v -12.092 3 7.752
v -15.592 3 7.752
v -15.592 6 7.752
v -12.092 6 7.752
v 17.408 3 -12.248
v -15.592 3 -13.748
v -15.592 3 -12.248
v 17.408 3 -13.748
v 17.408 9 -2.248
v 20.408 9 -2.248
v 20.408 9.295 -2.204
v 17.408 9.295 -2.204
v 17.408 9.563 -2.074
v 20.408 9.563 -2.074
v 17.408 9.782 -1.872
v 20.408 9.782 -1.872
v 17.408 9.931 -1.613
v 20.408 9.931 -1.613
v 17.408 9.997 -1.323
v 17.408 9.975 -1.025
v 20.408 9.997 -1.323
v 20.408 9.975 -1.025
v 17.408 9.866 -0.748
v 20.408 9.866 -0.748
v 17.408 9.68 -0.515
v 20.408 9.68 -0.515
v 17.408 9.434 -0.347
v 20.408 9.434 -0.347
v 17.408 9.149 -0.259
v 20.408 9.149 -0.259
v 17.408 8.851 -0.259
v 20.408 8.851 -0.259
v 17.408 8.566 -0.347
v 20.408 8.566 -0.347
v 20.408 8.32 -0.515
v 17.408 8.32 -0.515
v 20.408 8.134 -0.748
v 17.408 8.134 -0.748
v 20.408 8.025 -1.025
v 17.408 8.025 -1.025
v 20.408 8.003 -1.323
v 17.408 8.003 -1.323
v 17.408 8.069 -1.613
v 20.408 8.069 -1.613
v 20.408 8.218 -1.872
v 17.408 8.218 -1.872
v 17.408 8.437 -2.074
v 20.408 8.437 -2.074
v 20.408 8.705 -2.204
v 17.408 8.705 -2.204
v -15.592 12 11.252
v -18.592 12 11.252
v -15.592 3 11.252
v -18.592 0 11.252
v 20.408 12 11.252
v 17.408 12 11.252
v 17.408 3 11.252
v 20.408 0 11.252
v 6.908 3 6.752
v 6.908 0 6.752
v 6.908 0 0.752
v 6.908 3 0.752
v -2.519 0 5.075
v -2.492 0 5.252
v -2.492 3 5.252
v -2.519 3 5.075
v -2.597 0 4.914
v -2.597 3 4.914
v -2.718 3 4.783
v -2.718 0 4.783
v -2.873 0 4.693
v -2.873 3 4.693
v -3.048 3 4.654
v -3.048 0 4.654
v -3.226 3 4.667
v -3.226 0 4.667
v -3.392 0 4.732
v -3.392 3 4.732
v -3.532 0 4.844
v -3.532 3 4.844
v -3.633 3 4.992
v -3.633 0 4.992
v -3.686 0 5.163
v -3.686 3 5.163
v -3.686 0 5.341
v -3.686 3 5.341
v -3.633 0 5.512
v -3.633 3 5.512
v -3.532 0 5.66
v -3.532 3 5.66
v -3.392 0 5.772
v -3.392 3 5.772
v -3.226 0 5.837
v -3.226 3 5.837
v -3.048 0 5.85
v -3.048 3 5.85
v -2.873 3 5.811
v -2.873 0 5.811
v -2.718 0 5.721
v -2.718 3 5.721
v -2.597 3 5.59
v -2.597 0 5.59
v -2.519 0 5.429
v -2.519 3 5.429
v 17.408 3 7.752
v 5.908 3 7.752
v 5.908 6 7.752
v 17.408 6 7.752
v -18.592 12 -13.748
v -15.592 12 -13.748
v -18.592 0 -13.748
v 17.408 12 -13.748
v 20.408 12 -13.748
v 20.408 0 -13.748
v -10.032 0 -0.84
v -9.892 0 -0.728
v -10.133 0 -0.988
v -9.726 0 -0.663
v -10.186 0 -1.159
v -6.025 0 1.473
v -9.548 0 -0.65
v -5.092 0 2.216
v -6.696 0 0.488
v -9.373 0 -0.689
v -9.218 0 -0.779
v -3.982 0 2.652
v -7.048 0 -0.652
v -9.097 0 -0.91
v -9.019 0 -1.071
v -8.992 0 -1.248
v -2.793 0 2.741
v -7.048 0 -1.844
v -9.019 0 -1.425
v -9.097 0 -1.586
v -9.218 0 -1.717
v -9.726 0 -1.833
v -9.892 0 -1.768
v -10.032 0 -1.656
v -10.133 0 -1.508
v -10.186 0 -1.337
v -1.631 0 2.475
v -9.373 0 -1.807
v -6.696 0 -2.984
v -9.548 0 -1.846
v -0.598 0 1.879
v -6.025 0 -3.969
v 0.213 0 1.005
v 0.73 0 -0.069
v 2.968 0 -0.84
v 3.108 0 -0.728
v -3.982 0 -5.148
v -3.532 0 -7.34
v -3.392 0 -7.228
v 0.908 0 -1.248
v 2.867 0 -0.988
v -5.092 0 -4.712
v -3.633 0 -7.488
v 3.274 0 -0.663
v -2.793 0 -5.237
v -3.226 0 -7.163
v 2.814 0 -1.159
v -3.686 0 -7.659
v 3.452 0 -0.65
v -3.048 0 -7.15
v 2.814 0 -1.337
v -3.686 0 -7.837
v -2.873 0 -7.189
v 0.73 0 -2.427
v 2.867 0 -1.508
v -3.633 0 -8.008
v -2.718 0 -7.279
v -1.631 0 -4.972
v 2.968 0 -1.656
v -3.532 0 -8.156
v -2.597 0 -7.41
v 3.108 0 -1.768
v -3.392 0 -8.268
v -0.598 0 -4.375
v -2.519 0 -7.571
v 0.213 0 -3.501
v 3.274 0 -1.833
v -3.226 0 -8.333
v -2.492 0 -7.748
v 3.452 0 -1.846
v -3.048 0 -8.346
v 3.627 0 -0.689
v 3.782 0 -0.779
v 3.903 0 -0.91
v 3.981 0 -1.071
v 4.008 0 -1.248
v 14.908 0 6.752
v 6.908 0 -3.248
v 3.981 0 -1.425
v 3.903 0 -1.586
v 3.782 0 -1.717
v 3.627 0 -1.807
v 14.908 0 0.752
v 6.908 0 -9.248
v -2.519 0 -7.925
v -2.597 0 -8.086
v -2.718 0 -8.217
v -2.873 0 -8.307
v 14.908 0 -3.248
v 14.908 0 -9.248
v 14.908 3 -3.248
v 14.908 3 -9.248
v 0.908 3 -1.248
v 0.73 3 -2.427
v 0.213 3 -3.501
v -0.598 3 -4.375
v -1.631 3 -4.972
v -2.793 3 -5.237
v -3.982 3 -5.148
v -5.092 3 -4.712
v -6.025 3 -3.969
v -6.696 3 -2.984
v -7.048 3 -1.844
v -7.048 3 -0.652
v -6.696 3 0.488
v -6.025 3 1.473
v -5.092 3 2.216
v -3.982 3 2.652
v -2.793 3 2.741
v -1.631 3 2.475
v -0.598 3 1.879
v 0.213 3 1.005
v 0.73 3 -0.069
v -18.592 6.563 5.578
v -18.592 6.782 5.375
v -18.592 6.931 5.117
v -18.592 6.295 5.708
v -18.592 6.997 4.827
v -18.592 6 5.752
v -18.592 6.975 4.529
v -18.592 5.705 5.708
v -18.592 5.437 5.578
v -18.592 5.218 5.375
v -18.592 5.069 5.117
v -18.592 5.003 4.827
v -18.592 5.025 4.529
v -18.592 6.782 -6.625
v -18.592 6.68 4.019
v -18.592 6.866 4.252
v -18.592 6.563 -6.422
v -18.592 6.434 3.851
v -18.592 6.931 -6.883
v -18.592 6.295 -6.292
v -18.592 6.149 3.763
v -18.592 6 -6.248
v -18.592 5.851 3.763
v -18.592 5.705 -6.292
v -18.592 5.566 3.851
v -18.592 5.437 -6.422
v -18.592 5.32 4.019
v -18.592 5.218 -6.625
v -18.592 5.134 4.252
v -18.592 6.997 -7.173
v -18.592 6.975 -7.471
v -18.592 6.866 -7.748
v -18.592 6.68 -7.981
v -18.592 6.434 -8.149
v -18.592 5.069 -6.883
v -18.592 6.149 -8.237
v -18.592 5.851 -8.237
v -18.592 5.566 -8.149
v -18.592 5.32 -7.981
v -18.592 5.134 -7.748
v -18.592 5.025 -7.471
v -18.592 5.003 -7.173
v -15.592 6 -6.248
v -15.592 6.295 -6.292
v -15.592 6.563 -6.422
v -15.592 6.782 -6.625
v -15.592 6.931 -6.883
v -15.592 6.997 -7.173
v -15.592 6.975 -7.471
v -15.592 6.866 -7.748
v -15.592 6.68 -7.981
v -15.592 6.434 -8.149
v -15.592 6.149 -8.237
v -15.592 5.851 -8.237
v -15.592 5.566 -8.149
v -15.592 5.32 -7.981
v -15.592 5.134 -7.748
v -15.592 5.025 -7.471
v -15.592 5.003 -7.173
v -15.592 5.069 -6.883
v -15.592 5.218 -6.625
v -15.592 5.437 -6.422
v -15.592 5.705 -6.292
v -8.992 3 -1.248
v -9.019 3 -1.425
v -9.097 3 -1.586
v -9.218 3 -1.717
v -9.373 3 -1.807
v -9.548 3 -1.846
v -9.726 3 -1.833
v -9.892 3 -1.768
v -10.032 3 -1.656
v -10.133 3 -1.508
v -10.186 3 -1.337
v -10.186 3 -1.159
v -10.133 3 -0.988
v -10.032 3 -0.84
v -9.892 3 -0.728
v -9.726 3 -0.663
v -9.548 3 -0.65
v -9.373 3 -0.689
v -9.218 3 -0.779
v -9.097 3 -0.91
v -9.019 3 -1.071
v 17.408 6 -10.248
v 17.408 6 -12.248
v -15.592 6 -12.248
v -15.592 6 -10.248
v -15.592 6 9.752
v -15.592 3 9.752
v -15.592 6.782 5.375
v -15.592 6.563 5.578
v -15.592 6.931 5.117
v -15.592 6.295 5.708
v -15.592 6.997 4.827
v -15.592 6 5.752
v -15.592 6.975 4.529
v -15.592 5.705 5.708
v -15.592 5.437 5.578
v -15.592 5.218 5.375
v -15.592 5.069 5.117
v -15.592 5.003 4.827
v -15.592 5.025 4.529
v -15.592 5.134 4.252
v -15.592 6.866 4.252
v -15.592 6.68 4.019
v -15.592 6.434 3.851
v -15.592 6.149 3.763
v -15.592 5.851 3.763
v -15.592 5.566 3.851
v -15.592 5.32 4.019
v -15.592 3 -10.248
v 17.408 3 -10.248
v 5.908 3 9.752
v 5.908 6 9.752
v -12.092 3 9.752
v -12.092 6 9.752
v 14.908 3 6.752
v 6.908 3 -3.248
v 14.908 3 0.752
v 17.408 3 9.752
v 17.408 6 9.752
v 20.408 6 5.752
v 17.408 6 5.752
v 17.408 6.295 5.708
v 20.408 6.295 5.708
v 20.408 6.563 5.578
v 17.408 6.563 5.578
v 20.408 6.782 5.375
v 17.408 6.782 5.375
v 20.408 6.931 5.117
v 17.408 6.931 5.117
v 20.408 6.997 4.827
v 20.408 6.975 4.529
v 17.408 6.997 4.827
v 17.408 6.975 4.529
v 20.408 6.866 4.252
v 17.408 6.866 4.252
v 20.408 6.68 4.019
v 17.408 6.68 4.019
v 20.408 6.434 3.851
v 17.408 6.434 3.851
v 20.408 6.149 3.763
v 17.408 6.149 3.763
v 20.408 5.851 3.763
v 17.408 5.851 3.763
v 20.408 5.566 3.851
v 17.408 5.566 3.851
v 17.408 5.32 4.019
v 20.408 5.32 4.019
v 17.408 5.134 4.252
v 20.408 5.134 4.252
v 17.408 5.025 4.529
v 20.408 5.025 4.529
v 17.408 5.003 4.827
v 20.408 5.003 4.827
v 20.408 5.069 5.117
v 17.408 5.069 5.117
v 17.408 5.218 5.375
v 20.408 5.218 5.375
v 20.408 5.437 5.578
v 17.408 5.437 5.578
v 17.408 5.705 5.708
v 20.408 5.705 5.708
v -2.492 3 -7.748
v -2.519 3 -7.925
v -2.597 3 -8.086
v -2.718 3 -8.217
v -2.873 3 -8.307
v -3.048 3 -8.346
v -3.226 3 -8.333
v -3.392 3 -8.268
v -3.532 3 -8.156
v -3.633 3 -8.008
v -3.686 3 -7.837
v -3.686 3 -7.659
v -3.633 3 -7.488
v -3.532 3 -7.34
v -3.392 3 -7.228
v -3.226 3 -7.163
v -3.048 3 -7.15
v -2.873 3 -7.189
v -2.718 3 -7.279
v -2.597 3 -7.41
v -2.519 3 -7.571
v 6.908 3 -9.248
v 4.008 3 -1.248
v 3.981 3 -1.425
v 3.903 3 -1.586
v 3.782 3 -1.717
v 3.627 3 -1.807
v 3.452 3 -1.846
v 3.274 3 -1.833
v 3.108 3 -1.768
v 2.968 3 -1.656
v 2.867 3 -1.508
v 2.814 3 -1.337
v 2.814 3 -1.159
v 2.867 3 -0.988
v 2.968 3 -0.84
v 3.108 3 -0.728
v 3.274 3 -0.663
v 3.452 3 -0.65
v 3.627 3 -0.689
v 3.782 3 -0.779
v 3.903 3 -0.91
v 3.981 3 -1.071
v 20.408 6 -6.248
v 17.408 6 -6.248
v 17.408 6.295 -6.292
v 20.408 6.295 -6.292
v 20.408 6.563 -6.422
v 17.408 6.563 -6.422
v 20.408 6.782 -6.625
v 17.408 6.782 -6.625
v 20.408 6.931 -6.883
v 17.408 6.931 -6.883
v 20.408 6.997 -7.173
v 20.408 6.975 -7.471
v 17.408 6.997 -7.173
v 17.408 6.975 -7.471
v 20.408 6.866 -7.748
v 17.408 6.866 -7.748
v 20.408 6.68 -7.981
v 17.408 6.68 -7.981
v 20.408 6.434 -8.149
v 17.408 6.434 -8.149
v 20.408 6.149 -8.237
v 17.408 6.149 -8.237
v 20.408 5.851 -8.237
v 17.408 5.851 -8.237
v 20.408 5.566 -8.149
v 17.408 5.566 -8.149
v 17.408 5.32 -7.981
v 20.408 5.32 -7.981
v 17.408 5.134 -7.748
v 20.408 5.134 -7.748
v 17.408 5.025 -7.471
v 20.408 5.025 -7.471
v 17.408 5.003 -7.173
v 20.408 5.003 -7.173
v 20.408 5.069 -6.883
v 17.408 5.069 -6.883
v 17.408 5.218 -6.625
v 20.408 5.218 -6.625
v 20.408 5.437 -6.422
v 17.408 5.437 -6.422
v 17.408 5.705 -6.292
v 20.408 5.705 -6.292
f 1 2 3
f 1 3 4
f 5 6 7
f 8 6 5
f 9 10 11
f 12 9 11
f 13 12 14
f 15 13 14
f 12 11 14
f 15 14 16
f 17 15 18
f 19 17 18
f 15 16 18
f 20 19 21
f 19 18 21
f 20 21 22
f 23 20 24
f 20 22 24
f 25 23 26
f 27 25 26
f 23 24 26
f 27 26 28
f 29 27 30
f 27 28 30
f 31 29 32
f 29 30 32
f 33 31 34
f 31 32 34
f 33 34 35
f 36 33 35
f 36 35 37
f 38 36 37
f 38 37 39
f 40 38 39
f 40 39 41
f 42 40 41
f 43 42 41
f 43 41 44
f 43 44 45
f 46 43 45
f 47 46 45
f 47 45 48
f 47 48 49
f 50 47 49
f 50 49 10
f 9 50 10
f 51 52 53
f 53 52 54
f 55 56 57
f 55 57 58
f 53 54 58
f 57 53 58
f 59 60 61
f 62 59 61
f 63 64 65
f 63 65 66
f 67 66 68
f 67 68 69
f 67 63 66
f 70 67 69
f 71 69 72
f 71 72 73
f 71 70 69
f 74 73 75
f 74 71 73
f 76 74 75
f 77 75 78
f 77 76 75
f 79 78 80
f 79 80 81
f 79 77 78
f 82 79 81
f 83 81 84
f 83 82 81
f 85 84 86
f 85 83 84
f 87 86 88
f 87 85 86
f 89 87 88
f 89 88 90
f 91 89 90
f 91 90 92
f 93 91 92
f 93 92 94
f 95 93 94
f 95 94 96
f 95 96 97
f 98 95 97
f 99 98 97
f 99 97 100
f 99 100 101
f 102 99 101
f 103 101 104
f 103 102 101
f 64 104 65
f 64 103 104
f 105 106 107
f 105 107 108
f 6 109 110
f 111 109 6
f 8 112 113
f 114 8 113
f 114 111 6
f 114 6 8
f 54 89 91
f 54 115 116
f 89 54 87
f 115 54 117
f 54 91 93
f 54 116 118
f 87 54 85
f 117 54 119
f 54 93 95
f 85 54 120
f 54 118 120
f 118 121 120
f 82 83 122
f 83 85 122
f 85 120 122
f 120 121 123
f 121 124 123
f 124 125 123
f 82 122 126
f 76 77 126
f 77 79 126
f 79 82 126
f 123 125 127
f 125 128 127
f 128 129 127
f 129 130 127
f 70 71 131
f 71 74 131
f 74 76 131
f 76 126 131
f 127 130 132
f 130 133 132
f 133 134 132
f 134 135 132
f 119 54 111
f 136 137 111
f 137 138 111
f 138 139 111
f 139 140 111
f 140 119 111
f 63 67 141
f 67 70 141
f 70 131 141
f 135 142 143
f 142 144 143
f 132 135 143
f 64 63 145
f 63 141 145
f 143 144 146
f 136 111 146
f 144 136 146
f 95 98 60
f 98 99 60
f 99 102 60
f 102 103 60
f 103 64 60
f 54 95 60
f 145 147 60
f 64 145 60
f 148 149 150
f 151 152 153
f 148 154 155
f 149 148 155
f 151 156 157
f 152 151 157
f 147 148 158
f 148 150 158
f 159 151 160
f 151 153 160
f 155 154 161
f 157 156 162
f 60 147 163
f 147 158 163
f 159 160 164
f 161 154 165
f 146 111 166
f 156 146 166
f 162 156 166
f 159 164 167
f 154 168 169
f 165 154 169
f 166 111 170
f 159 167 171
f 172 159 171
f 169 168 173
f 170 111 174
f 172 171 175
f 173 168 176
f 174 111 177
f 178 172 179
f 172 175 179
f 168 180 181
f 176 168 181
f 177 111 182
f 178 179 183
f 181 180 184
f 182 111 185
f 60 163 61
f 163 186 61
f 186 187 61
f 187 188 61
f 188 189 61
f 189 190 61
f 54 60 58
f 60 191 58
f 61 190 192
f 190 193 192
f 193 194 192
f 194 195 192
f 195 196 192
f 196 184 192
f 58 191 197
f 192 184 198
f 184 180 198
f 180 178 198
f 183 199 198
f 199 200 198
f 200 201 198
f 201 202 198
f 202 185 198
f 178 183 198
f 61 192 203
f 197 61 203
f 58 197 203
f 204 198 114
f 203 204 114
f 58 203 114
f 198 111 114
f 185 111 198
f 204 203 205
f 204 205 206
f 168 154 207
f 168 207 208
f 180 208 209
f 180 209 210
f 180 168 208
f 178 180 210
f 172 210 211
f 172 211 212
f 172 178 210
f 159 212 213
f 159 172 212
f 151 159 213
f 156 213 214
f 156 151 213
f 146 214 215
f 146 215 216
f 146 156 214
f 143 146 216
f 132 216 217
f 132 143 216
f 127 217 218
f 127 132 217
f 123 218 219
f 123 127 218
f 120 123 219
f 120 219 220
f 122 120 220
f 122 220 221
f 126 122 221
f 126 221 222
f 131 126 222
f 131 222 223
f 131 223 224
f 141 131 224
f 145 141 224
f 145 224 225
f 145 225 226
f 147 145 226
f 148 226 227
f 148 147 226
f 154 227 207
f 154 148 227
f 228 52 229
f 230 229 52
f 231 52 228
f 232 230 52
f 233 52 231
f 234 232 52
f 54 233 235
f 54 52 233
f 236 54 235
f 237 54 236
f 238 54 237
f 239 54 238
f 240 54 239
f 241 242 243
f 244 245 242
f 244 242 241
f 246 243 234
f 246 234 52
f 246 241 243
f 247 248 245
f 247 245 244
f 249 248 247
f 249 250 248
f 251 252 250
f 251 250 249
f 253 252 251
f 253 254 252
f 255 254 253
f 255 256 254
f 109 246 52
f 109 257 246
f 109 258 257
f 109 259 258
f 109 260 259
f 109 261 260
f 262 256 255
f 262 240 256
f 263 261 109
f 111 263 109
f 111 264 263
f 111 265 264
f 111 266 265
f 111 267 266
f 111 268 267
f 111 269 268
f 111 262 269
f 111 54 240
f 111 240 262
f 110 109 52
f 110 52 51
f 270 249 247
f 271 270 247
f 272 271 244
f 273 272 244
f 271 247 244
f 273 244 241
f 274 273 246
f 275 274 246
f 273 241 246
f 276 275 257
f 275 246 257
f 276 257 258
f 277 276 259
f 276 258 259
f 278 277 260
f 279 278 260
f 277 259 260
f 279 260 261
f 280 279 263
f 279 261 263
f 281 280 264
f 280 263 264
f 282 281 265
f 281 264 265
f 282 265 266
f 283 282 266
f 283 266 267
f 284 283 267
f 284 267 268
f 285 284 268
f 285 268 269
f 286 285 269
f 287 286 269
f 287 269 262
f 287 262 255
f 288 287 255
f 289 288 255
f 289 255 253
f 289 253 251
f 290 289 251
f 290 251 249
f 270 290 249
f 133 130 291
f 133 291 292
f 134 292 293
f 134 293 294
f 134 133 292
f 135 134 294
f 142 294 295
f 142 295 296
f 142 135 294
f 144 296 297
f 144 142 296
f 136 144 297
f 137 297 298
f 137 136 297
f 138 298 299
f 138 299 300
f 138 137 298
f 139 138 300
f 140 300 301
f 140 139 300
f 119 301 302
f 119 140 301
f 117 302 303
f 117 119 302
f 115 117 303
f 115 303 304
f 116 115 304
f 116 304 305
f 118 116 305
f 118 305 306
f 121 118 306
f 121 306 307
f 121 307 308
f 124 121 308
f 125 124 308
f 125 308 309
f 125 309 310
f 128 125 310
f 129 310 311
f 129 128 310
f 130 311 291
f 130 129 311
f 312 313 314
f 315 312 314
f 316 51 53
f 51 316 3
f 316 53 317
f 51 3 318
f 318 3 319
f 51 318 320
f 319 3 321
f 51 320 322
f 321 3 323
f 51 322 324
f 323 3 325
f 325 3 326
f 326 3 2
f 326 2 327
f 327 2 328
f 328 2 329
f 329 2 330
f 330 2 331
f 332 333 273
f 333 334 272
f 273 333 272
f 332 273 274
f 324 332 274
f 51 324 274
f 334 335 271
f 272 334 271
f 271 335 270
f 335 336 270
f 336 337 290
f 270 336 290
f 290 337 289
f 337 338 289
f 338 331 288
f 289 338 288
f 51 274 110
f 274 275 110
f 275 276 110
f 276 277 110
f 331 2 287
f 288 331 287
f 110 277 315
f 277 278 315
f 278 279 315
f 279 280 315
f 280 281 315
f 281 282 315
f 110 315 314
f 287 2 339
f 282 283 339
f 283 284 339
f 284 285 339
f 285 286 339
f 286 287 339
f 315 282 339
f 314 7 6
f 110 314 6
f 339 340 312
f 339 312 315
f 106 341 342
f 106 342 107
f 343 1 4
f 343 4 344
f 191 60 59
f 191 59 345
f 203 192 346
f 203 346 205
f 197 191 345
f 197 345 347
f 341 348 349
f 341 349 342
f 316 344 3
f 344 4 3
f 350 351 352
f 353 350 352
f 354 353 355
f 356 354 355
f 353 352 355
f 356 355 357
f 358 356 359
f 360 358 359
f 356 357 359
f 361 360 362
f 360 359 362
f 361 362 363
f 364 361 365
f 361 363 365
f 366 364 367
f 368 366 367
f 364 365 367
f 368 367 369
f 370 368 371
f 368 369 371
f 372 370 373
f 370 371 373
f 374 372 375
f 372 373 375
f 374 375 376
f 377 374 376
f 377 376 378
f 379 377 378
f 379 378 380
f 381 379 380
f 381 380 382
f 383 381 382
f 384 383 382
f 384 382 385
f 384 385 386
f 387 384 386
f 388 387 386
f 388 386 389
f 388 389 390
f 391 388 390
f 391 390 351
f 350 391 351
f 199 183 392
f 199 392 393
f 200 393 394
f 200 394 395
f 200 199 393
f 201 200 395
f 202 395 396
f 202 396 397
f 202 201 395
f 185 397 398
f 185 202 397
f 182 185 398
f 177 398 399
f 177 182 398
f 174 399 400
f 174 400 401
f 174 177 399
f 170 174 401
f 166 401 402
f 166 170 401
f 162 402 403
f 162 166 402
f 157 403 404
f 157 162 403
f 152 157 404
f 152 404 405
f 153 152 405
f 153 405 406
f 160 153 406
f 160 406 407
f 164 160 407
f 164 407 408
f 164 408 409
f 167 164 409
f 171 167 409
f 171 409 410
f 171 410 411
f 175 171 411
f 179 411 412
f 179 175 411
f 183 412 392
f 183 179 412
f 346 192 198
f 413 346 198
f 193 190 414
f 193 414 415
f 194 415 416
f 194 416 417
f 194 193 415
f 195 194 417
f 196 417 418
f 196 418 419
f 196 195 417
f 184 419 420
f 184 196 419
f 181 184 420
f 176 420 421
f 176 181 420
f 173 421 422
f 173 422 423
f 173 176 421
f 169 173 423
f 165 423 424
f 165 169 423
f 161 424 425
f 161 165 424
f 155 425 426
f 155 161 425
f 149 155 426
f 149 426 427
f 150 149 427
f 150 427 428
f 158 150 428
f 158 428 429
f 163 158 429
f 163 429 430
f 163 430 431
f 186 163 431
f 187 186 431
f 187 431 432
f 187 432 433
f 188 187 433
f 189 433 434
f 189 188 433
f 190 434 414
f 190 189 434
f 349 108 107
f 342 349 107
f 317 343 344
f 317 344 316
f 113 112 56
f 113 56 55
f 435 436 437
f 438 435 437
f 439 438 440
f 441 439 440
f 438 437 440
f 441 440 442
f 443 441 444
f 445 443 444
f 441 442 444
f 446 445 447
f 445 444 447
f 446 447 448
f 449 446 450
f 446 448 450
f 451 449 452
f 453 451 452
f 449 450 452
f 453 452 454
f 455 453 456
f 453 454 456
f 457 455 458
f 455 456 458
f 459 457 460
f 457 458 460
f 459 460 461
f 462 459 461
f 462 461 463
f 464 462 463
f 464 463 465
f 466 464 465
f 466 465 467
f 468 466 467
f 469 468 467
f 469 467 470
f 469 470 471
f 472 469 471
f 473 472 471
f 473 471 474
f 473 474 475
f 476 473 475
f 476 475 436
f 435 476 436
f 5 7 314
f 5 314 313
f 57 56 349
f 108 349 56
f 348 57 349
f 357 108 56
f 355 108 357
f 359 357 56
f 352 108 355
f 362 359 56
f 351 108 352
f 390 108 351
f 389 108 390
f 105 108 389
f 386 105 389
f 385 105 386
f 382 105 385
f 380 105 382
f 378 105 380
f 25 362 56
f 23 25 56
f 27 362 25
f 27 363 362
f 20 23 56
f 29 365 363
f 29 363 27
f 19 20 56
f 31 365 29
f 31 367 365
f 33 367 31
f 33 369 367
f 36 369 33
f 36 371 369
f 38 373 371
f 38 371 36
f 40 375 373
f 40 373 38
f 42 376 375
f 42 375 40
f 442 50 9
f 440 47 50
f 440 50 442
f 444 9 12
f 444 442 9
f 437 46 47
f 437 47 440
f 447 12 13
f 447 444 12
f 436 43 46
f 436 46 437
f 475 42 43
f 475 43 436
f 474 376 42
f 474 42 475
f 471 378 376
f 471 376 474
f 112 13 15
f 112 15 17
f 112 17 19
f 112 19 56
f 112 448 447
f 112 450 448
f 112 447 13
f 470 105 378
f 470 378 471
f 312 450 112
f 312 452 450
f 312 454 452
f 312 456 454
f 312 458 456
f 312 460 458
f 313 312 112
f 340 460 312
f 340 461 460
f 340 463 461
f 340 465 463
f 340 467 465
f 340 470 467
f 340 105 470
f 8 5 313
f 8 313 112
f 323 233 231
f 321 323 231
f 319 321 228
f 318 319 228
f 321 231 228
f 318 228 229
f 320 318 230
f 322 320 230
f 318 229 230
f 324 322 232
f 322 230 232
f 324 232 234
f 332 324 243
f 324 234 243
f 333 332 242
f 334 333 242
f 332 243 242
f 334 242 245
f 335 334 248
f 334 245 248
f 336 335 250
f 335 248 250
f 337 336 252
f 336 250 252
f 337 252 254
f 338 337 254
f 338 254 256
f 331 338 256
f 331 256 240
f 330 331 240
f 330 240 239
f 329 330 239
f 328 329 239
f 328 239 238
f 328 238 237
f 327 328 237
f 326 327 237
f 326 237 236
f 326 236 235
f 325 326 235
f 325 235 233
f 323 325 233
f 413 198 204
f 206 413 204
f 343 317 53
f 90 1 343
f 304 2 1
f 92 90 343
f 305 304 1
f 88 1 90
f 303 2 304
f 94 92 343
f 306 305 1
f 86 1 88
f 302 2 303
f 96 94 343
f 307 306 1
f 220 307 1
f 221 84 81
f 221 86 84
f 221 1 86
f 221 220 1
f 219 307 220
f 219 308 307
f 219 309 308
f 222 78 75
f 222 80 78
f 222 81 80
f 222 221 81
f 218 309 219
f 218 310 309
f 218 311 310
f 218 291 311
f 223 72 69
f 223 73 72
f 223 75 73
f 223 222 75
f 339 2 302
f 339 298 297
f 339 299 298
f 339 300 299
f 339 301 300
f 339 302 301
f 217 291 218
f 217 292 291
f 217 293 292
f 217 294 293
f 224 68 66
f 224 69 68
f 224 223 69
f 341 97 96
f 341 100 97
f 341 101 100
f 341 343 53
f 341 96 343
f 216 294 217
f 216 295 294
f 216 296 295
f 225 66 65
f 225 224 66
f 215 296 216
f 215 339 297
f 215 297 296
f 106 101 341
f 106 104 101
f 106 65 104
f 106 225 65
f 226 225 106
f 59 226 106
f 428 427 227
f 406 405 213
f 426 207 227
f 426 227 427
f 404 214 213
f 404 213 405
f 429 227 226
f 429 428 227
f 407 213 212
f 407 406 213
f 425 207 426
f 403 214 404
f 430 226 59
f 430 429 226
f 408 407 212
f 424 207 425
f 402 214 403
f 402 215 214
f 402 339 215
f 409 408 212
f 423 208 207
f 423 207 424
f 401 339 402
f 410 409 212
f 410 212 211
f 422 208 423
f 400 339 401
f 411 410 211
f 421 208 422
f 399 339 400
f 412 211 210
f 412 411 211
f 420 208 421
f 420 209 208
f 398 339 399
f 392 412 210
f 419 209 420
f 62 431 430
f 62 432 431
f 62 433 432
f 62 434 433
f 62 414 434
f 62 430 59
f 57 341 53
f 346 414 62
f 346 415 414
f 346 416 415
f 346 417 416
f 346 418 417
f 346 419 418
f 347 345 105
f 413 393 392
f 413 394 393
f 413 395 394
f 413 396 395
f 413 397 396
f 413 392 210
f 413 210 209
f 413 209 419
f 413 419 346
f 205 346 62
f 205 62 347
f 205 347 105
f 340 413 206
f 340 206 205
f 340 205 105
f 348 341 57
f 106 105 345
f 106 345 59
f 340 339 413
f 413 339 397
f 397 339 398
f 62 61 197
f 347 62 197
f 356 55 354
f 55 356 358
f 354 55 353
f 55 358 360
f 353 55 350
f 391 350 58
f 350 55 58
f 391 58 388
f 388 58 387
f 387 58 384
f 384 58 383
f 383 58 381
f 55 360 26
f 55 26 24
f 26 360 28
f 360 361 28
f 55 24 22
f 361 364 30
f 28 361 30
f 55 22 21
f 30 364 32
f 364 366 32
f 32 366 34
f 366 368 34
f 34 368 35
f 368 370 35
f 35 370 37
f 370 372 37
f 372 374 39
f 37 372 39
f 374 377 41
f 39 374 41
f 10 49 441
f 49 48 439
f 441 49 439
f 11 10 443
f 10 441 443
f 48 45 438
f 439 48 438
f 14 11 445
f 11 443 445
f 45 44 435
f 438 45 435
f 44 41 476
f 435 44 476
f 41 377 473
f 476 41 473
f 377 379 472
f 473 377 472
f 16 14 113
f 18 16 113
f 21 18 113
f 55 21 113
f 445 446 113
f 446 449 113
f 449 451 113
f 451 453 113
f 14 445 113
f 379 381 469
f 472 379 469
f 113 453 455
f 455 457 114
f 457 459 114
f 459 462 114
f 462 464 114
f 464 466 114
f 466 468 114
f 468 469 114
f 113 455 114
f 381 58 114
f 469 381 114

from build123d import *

# Parameters (mm, degrees)
CROQUIS1_W              = 39
CROQUIS1_H              = 25
CROQUIS1_R              = 4.000000275
CROQUIS1_R_2            = 0.600000034
CROQUIS1_W_2            = 8
CROQUIS1_H_2            = 6
SALIENTE_EXTRUIR1_DEPTH = 3
SALIENTE_EXTRUIR2_DEPTH = 3
CROQUIS3_W              = 3
CROQUIS3_H              = 25
SALIENTE_EXTRUIR3_DEPTH = 6
CROQUIS4_R              = 1
CORTAR_EXTRUIR1_DEPTH   = 45
CROQUIS5_R              = 1
CORTAR_EXTRUIR2_DEPTH   = 27


with BuildPart() as part:
    # Croquis1 → Saliente-Extruir1 (new body)
    with BuildSketch(Plane(origin=(0, 0, 0), x_dir=(1, 0, 0), z_dir=(0, 1, 0))):
        with Locations((0.907645754, 1.248012912)):
            Rectangle(CROQUIS1_W, CROQUIS1_H)
        with Locations((-3.09235459, 1.24801291)):
            Circle(CROQUIS1_R, mode=Mode.SUBTRACT)
        with Locations((-3.092354224, 7.748013103)):
            Circle(CROQUIS1_R_2, mode=Mode.SUBTRACT)
        with Locations((3.407645945, 1.248012891)):
            Circle(CROQUIS1_R_2, mode=Mode.SUBTRACT)
        with Locations((-3.092354267, -5.251987278)):
            Circle(CROQUIS1_R_2, mode=Mode.SUBTRACT)
        with Locations((-9.592354436, 1.248012934)):
            Circle(CROQUIS1_R_2, mode=Mode.SUBTRACT)
        with Locations((10.907645754, -3.751987088)):
            Rectangle(CROQUIS1_W_2, CROQUIS1_H_2, mode=Mode.SUBTRACT)
        with Locations((10.907645754, 6.248012912)):
            Rectangle(CROQUIS1_W_2, CROQUIS1_H_2, mode=Mode.SUBTRACT)
    extrude(amount=SALIENTE_EXTRUIR1_DEPTH)

    # Croquis2 → Saliente-Extruir2 (add)
    with BuildSketch(Plane(origin=(0, 3, 0), x_dir=(1, 0, 0), z_dir=(0, 1, 0))):
        Polygon((-18.592354246, 13.748012912), (-15.592354246, 13.748012912), (-15.592354246, 12.248012912), (17.407645754, 12.248012912), (17.407645754, 13.748012912), (20.407645754, 13.748012912), (20.407645754, -11.251987088), (17.407645754, -11.251987088), (17.407645754, -9.751987088), (5.907645754, -9.751987088), (5.907645754, -7.751987088), (17.407645754, -7.751987088), (17.407645754, 10.248012912), (-15.592354246, 10.248012912), (-15.592354246, -7.751987088), (-12.092354246, -7.751987088), (-12.092354246, -9.751987088), (-15.592354246, -9.751987088), (-15.592354246, -11.251987088), (-18.592354246, -11.251987088), align=None)
    extrude(amount=SALIENTE_EXTRUIR2_DEPTH)

    # Croquis3 → Saliente-Extruir3 (add)
    with BuildSketch(Plane(origin=(0, 6, 0), x_dir=(1, 0, 0), z_dir=(0, 1, 0))):
        with Locations((-17.092354246, 1.248012912)):
            Rectangle(CROQUIS3_W, CROQUIS3_H)
        with Locations((18.907645754, 1.248012912)):
            Rectangle(CROQUIS3_W, CROQUIS3_H)
    extrude(amount=SALIENTE_EXTRUIR3_DEPTH)

    # Croquis4 → Cortar-Extruir1 (cut)
    with BuildSketch(Plane.ZY.offset(18.592354246)):
        with Locations((-7.248012912, 6)):
            Circle(CROQUIS4_R)
        with Locations((4.751987088, 6)):
            Circle(CROQUIS4_R)
    extrude(amount=-CORTAR_EXTRUIR1_DEPTH, mode=Mode.SUBTRACT)

    # Croquis5 → Cortar-Extruir2 (cut)
    with BuildSketch(Plane(origin=(20.407645754, 0, 0), x_dir=(0, 0, -1), z_dir=(1, 0, 0))):
        with Locations((1.248012912, 9)):
            Circle(CROQUIS5_R)
    extrude(amount=-CORTAR_EXTRUIR2_DEPTH, mode=Mode.SUBTRACT)


solid = part.part
